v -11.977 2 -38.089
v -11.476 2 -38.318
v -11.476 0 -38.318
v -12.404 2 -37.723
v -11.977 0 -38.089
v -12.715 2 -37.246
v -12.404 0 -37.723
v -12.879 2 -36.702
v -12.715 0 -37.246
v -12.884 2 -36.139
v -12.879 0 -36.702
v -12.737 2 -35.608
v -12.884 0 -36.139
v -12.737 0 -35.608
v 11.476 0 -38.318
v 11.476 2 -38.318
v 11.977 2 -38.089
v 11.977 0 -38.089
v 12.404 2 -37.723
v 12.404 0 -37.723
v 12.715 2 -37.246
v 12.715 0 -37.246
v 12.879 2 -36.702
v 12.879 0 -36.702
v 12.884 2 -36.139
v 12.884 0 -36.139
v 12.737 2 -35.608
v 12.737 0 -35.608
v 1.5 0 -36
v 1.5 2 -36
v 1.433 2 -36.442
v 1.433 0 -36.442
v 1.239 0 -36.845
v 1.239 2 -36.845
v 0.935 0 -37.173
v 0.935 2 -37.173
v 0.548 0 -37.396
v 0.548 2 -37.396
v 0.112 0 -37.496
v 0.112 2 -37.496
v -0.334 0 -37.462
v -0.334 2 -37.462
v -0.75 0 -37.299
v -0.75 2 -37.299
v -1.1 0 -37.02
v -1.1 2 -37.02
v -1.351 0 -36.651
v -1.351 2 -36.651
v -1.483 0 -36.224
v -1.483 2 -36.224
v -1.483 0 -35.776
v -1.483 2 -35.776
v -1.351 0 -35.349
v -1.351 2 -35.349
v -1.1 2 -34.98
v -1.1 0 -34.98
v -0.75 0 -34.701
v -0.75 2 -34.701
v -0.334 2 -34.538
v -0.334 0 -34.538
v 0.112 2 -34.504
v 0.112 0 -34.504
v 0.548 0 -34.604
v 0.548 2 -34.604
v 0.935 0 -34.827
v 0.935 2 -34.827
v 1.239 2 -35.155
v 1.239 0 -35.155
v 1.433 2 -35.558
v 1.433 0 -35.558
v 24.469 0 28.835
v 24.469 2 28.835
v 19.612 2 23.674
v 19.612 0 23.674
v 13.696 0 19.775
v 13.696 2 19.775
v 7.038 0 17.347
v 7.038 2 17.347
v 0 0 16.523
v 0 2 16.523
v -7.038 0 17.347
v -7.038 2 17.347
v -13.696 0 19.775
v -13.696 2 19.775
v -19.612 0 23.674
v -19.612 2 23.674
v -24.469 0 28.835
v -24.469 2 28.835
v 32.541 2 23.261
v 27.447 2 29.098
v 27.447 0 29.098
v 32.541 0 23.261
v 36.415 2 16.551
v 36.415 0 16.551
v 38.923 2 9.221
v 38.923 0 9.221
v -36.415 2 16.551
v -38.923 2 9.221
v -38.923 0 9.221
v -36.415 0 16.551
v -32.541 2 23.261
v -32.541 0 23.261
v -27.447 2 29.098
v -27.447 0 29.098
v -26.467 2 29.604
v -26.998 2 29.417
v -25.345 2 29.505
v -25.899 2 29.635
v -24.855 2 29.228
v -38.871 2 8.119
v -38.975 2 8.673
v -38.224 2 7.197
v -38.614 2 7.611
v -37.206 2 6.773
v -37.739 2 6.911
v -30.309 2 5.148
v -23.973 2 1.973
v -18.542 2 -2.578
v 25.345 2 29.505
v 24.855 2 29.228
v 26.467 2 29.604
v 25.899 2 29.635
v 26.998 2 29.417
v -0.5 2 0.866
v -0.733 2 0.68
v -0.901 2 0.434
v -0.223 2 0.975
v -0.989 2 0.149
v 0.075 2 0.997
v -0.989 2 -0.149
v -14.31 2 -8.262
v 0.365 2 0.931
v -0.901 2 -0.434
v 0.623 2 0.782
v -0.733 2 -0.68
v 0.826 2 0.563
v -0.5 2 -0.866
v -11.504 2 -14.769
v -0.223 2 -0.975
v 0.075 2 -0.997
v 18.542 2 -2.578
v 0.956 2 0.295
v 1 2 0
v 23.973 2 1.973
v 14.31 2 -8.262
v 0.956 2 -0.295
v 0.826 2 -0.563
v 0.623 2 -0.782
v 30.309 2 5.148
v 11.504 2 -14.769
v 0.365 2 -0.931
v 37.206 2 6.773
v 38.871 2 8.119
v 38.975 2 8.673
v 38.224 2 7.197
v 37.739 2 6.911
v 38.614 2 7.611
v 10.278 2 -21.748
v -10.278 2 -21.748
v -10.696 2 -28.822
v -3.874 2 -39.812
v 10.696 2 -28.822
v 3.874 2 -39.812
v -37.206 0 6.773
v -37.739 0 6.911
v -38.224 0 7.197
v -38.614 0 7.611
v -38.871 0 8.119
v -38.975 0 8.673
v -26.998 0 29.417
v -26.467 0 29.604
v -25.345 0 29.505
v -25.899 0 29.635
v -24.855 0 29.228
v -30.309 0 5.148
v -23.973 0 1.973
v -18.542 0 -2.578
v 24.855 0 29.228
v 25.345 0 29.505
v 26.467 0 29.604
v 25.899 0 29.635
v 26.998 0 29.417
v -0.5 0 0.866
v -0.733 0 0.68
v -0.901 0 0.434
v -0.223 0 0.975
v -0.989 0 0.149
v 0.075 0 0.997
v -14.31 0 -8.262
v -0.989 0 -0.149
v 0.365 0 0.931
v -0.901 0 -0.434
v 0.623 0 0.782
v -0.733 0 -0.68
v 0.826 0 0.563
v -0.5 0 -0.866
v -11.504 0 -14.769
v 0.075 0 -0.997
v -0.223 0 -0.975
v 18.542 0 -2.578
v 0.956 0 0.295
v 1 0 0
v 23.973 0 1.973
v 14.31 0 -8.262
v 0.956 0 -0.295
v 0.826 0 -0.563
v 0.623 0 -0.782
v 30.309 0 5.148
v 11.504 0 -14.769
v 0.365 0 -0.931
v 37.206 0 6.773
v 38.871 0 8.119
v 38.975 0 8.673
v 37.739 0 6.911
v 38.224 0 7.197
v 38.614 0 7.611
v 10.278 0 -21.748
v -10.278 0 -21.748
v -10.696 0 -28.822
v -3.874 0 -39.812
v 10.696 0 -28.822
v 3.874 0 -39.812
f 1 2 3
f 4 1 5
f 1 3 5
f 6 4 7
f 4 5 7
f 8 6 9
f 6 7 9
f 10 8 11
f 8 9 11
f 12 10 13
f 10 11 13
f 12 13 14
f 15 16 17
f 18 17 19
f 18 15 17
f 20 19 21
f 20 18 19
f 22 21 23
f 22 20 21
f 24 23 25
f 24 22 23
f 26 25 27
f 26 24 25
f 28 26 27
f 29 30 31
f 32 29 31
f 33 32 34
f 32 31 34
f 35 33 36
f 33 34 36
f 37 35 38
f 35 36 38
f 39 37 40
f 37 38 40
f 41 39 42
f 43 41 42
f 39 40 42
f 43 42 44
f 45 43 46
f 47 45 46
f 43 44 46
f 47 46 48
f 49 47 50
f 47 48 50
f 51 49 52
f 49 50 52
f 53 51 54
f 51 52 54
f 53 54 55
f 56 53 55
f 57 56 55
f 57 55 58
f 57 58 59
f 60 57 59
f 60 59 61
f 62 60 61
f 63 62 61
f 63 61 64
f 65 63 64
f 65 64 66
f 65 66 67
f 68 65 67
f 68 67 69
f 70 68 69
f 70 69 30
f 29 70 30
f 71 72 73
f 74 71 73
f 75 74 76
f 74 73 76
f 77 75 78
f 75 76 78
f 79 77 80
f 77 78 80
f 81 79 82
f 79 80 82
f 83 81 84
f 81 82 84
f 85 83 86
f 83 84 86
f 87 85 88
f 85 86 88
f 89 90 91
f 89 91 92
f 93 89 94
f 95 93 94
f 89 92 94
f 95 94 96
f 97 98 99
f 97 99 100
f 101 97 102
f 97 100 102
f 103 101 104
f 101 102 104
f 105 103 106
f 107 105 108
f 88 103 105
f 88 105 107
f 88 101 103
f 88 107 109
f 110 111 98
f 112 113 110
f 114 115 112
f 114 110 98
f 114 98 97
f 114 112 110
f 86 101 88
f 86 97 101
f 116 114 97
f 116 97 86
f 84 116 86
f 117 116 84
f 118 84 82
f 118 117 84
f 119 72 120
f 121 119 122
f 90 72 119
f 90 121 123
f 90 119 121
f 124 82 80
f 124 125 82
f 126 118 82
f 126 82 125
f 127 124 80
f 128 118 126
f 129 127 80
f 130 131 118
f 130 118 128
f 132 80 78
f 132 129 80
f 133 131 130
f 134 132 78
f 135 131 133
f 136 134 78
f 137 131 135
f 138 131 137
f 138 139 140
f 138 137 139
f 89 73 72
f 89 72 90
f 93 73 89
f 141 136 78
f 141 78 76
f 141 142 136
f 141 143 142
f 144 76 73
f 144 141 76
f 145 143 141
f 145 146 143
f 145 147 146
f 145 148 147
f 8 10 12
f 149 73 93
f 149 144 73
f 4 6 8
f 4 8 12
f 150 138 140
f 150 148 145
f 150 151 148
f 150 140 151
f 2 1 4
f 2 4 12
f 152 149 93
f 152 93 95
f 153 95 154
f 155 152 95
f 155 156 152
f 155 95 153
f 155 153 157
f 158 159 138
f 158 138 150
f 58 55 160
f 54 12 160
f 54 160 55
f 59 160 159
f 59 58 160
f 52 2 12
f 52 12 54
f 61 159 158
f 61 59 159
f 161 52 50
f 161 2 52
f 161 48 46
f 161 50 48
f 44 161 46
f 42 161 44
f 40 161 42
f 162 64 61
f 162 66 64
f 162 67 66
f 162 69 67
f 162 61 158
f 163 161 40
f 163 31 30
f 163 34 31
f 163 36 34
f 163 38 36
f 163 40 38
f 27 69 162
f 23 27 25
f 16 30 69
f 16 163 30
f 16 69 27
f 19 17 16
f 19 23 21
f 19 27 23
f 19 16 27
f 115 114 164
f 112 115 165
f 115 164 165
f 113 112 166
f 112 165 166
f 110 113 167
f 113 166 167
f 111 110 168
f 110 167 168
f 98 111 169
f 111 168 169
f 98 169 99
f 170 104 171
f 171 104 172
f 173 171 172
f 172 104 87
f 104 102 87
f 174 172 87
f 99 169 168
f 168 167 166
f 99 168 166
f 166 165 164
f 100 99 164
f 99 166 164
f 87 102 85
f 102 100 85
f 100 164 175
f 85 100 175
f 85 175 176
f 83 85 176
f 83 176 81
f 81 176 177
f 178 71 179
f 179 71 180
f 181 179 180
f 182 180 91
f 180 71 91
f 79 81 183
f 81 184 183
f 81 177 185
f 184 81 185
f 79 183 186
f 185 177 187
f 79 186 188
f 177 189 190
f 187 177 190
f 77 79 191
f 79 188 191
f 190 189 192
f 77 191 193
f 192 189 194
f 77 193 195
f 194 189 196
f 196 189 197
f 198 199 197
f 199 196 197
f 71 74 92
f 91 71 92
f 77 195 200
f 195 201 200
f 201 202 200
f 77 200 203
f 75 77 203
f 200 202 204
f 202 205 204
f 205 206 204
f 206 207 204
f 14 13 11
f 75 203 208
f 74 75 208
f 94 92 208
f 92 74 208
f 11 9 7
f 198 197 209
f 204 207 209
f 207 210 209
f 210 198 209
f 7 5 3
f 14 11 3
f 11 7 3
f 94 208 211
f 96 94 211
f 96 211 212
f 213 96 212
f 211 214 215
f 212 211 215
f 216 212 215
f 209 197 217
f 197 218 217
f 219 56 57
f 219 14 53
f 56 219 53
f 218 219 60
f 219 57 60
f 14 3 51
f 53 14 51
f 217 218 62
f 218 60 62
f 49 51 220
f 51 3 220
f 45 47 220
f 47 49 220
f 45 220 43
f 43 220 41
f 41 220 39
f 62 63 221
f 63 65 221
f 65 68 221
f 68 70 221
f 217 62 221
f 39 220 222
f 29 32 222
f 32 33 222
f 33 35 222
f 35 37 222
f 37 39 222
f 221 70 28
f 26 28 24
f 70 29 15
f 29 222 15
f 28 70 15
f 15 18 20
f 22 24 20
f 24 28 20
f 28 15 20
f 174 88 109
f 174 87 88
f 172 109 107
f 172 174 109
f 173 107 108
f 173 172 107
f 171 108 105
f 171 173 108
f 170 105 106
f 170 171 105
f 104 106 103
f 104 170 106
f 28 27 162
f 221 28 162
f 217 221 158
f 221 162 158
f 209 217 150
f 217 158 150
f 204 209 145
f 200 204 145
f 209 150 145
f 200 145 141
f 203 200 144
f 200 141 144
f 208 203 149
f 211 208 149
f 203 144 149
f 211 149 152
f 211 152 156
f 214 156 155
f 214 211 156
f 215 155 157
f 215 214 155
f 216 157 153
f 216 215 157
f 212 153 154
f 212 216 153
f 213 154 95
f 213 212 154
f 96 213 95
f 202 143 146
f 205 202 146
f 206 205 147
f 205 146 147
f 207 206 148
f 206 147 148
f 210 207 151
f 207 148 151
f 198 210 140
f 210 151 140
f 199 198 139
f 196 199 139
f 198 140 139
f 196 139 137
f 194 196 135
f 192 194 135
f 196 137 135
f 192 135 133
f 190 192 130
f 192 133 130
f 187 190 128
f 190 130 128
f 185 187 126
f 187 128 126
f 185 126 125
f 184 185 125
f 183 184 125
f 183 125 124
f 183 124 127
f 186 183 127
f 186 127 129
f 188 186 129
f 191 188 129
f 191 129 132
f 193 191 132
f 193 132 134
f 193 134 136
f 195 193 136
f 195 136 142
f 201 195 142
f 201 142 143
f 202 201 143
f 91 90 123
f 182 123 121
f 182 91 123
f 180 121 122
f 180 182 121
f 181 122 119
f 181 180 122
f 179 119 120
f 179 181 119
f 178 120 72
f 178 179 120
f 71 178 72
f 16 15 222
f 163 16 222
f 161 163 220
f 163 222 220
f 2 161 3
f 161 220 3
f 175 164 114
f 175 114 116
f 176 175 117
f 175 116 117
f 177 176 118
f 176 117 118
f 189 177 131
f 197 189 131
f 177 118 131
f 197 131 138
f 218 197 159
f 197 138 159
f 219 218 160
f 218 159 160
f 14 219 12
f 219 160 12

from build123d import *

# Parameters (mm, degrees)
SKETCH1_R           = 40
BOSS_EXTRUDE1_DEPTH = 2
SKETCH5_R           = 1.5
CUT_EXTRUDE2_DEPTH  = 3
SKETCH7_R           = 1
CUT_EXTRUDE4_DEPTH  = 3
SKETCH8_R           = 30.471270003
CUT_EXTRUDE5_DEPTH  = 3
CIRPATTERN1_COUNT   = 3
FILLET1_R           = 2


with BuildPart() as part:
    # Sketch1 → Boss-Extrude1 (new body)
    with BuildSketch(Plane(origin=(0, 0, 0), x_dir=(1, 0, 0), z_dir=(0, 1, 0))):
        Circle(SKETCH1_R)
    extrude(amount=BOSS_EXTRUDE1_DEPTH)

    # Sketch5 → Cut-Extrude2 (cut, through all)
    with BuildSketch(Plane(origin=(0, 2, 0), x_dir=(1, 0, 0), z_dir=(0, 1, 0))):
        with Locations((0, 36)):
            Circle(SKETCH5_R)
    extrude(amount=-CUT_EXTRUDE2_DEPTH, mode=Mode.SUBTRACT)

    # Sketch7 → Cut-Extrude4 (cut, through all)
    with BuildSketch(Plane(origin=(0, 2, 0), x_dir=(1, 0, 0), z_dir=(0, 1, 0))):
        Circle(SKETCH7_R)
    extrude(amount=-CUT_EXTRUDE4_DEPTH, mode=Mode.SUBTRACT)

    # Sketch8 → Cut-Extrude5 (cut, through all)
    with BuildSketch(Plane(origin=(0, 2, 0), x_dir=(1, 0, 0), z_dir=(0, 1, 0))):
        with Locations((40.698571494, 23.497331208)):
            Circle(SKETCH8_R)
    cut_extrude5 = extrude(amount=-CUT_EXTRUDE5_DEPTH, mode=Mode.SUBTRACT)

    # CirPattern1: Cut-Extrude5 ×3 about axis
    cirpattern1_axis = Axis((0, 0, 0), (0, 1, 0))
    for i in range(1, CIRPATTERN1_COUNT):
        add(cut_extrude5.rotate(cirpattern1_axis, i * 360 / CIRPATTERN1_COUNT), mode=Mode.SUBTRACT)

    # Fillet1
    fillet1_edges = [part.edges().sort_by_distance(p)[0] for p in [
        (39.39231012, 1, 6.945927107),
        (13.680805733, 1, -37.587704831),
        (-25.711504387, 1, 30.641777725),
        (25.711504387, 1, 30.641777725),
        (-13.680805733, 1, -37.587704831),
        (-39.39231012, 1, 6.945927107),
    ]]
    fillet(fillet1_edges, radius=FILLET1_R)


solid = part.part
